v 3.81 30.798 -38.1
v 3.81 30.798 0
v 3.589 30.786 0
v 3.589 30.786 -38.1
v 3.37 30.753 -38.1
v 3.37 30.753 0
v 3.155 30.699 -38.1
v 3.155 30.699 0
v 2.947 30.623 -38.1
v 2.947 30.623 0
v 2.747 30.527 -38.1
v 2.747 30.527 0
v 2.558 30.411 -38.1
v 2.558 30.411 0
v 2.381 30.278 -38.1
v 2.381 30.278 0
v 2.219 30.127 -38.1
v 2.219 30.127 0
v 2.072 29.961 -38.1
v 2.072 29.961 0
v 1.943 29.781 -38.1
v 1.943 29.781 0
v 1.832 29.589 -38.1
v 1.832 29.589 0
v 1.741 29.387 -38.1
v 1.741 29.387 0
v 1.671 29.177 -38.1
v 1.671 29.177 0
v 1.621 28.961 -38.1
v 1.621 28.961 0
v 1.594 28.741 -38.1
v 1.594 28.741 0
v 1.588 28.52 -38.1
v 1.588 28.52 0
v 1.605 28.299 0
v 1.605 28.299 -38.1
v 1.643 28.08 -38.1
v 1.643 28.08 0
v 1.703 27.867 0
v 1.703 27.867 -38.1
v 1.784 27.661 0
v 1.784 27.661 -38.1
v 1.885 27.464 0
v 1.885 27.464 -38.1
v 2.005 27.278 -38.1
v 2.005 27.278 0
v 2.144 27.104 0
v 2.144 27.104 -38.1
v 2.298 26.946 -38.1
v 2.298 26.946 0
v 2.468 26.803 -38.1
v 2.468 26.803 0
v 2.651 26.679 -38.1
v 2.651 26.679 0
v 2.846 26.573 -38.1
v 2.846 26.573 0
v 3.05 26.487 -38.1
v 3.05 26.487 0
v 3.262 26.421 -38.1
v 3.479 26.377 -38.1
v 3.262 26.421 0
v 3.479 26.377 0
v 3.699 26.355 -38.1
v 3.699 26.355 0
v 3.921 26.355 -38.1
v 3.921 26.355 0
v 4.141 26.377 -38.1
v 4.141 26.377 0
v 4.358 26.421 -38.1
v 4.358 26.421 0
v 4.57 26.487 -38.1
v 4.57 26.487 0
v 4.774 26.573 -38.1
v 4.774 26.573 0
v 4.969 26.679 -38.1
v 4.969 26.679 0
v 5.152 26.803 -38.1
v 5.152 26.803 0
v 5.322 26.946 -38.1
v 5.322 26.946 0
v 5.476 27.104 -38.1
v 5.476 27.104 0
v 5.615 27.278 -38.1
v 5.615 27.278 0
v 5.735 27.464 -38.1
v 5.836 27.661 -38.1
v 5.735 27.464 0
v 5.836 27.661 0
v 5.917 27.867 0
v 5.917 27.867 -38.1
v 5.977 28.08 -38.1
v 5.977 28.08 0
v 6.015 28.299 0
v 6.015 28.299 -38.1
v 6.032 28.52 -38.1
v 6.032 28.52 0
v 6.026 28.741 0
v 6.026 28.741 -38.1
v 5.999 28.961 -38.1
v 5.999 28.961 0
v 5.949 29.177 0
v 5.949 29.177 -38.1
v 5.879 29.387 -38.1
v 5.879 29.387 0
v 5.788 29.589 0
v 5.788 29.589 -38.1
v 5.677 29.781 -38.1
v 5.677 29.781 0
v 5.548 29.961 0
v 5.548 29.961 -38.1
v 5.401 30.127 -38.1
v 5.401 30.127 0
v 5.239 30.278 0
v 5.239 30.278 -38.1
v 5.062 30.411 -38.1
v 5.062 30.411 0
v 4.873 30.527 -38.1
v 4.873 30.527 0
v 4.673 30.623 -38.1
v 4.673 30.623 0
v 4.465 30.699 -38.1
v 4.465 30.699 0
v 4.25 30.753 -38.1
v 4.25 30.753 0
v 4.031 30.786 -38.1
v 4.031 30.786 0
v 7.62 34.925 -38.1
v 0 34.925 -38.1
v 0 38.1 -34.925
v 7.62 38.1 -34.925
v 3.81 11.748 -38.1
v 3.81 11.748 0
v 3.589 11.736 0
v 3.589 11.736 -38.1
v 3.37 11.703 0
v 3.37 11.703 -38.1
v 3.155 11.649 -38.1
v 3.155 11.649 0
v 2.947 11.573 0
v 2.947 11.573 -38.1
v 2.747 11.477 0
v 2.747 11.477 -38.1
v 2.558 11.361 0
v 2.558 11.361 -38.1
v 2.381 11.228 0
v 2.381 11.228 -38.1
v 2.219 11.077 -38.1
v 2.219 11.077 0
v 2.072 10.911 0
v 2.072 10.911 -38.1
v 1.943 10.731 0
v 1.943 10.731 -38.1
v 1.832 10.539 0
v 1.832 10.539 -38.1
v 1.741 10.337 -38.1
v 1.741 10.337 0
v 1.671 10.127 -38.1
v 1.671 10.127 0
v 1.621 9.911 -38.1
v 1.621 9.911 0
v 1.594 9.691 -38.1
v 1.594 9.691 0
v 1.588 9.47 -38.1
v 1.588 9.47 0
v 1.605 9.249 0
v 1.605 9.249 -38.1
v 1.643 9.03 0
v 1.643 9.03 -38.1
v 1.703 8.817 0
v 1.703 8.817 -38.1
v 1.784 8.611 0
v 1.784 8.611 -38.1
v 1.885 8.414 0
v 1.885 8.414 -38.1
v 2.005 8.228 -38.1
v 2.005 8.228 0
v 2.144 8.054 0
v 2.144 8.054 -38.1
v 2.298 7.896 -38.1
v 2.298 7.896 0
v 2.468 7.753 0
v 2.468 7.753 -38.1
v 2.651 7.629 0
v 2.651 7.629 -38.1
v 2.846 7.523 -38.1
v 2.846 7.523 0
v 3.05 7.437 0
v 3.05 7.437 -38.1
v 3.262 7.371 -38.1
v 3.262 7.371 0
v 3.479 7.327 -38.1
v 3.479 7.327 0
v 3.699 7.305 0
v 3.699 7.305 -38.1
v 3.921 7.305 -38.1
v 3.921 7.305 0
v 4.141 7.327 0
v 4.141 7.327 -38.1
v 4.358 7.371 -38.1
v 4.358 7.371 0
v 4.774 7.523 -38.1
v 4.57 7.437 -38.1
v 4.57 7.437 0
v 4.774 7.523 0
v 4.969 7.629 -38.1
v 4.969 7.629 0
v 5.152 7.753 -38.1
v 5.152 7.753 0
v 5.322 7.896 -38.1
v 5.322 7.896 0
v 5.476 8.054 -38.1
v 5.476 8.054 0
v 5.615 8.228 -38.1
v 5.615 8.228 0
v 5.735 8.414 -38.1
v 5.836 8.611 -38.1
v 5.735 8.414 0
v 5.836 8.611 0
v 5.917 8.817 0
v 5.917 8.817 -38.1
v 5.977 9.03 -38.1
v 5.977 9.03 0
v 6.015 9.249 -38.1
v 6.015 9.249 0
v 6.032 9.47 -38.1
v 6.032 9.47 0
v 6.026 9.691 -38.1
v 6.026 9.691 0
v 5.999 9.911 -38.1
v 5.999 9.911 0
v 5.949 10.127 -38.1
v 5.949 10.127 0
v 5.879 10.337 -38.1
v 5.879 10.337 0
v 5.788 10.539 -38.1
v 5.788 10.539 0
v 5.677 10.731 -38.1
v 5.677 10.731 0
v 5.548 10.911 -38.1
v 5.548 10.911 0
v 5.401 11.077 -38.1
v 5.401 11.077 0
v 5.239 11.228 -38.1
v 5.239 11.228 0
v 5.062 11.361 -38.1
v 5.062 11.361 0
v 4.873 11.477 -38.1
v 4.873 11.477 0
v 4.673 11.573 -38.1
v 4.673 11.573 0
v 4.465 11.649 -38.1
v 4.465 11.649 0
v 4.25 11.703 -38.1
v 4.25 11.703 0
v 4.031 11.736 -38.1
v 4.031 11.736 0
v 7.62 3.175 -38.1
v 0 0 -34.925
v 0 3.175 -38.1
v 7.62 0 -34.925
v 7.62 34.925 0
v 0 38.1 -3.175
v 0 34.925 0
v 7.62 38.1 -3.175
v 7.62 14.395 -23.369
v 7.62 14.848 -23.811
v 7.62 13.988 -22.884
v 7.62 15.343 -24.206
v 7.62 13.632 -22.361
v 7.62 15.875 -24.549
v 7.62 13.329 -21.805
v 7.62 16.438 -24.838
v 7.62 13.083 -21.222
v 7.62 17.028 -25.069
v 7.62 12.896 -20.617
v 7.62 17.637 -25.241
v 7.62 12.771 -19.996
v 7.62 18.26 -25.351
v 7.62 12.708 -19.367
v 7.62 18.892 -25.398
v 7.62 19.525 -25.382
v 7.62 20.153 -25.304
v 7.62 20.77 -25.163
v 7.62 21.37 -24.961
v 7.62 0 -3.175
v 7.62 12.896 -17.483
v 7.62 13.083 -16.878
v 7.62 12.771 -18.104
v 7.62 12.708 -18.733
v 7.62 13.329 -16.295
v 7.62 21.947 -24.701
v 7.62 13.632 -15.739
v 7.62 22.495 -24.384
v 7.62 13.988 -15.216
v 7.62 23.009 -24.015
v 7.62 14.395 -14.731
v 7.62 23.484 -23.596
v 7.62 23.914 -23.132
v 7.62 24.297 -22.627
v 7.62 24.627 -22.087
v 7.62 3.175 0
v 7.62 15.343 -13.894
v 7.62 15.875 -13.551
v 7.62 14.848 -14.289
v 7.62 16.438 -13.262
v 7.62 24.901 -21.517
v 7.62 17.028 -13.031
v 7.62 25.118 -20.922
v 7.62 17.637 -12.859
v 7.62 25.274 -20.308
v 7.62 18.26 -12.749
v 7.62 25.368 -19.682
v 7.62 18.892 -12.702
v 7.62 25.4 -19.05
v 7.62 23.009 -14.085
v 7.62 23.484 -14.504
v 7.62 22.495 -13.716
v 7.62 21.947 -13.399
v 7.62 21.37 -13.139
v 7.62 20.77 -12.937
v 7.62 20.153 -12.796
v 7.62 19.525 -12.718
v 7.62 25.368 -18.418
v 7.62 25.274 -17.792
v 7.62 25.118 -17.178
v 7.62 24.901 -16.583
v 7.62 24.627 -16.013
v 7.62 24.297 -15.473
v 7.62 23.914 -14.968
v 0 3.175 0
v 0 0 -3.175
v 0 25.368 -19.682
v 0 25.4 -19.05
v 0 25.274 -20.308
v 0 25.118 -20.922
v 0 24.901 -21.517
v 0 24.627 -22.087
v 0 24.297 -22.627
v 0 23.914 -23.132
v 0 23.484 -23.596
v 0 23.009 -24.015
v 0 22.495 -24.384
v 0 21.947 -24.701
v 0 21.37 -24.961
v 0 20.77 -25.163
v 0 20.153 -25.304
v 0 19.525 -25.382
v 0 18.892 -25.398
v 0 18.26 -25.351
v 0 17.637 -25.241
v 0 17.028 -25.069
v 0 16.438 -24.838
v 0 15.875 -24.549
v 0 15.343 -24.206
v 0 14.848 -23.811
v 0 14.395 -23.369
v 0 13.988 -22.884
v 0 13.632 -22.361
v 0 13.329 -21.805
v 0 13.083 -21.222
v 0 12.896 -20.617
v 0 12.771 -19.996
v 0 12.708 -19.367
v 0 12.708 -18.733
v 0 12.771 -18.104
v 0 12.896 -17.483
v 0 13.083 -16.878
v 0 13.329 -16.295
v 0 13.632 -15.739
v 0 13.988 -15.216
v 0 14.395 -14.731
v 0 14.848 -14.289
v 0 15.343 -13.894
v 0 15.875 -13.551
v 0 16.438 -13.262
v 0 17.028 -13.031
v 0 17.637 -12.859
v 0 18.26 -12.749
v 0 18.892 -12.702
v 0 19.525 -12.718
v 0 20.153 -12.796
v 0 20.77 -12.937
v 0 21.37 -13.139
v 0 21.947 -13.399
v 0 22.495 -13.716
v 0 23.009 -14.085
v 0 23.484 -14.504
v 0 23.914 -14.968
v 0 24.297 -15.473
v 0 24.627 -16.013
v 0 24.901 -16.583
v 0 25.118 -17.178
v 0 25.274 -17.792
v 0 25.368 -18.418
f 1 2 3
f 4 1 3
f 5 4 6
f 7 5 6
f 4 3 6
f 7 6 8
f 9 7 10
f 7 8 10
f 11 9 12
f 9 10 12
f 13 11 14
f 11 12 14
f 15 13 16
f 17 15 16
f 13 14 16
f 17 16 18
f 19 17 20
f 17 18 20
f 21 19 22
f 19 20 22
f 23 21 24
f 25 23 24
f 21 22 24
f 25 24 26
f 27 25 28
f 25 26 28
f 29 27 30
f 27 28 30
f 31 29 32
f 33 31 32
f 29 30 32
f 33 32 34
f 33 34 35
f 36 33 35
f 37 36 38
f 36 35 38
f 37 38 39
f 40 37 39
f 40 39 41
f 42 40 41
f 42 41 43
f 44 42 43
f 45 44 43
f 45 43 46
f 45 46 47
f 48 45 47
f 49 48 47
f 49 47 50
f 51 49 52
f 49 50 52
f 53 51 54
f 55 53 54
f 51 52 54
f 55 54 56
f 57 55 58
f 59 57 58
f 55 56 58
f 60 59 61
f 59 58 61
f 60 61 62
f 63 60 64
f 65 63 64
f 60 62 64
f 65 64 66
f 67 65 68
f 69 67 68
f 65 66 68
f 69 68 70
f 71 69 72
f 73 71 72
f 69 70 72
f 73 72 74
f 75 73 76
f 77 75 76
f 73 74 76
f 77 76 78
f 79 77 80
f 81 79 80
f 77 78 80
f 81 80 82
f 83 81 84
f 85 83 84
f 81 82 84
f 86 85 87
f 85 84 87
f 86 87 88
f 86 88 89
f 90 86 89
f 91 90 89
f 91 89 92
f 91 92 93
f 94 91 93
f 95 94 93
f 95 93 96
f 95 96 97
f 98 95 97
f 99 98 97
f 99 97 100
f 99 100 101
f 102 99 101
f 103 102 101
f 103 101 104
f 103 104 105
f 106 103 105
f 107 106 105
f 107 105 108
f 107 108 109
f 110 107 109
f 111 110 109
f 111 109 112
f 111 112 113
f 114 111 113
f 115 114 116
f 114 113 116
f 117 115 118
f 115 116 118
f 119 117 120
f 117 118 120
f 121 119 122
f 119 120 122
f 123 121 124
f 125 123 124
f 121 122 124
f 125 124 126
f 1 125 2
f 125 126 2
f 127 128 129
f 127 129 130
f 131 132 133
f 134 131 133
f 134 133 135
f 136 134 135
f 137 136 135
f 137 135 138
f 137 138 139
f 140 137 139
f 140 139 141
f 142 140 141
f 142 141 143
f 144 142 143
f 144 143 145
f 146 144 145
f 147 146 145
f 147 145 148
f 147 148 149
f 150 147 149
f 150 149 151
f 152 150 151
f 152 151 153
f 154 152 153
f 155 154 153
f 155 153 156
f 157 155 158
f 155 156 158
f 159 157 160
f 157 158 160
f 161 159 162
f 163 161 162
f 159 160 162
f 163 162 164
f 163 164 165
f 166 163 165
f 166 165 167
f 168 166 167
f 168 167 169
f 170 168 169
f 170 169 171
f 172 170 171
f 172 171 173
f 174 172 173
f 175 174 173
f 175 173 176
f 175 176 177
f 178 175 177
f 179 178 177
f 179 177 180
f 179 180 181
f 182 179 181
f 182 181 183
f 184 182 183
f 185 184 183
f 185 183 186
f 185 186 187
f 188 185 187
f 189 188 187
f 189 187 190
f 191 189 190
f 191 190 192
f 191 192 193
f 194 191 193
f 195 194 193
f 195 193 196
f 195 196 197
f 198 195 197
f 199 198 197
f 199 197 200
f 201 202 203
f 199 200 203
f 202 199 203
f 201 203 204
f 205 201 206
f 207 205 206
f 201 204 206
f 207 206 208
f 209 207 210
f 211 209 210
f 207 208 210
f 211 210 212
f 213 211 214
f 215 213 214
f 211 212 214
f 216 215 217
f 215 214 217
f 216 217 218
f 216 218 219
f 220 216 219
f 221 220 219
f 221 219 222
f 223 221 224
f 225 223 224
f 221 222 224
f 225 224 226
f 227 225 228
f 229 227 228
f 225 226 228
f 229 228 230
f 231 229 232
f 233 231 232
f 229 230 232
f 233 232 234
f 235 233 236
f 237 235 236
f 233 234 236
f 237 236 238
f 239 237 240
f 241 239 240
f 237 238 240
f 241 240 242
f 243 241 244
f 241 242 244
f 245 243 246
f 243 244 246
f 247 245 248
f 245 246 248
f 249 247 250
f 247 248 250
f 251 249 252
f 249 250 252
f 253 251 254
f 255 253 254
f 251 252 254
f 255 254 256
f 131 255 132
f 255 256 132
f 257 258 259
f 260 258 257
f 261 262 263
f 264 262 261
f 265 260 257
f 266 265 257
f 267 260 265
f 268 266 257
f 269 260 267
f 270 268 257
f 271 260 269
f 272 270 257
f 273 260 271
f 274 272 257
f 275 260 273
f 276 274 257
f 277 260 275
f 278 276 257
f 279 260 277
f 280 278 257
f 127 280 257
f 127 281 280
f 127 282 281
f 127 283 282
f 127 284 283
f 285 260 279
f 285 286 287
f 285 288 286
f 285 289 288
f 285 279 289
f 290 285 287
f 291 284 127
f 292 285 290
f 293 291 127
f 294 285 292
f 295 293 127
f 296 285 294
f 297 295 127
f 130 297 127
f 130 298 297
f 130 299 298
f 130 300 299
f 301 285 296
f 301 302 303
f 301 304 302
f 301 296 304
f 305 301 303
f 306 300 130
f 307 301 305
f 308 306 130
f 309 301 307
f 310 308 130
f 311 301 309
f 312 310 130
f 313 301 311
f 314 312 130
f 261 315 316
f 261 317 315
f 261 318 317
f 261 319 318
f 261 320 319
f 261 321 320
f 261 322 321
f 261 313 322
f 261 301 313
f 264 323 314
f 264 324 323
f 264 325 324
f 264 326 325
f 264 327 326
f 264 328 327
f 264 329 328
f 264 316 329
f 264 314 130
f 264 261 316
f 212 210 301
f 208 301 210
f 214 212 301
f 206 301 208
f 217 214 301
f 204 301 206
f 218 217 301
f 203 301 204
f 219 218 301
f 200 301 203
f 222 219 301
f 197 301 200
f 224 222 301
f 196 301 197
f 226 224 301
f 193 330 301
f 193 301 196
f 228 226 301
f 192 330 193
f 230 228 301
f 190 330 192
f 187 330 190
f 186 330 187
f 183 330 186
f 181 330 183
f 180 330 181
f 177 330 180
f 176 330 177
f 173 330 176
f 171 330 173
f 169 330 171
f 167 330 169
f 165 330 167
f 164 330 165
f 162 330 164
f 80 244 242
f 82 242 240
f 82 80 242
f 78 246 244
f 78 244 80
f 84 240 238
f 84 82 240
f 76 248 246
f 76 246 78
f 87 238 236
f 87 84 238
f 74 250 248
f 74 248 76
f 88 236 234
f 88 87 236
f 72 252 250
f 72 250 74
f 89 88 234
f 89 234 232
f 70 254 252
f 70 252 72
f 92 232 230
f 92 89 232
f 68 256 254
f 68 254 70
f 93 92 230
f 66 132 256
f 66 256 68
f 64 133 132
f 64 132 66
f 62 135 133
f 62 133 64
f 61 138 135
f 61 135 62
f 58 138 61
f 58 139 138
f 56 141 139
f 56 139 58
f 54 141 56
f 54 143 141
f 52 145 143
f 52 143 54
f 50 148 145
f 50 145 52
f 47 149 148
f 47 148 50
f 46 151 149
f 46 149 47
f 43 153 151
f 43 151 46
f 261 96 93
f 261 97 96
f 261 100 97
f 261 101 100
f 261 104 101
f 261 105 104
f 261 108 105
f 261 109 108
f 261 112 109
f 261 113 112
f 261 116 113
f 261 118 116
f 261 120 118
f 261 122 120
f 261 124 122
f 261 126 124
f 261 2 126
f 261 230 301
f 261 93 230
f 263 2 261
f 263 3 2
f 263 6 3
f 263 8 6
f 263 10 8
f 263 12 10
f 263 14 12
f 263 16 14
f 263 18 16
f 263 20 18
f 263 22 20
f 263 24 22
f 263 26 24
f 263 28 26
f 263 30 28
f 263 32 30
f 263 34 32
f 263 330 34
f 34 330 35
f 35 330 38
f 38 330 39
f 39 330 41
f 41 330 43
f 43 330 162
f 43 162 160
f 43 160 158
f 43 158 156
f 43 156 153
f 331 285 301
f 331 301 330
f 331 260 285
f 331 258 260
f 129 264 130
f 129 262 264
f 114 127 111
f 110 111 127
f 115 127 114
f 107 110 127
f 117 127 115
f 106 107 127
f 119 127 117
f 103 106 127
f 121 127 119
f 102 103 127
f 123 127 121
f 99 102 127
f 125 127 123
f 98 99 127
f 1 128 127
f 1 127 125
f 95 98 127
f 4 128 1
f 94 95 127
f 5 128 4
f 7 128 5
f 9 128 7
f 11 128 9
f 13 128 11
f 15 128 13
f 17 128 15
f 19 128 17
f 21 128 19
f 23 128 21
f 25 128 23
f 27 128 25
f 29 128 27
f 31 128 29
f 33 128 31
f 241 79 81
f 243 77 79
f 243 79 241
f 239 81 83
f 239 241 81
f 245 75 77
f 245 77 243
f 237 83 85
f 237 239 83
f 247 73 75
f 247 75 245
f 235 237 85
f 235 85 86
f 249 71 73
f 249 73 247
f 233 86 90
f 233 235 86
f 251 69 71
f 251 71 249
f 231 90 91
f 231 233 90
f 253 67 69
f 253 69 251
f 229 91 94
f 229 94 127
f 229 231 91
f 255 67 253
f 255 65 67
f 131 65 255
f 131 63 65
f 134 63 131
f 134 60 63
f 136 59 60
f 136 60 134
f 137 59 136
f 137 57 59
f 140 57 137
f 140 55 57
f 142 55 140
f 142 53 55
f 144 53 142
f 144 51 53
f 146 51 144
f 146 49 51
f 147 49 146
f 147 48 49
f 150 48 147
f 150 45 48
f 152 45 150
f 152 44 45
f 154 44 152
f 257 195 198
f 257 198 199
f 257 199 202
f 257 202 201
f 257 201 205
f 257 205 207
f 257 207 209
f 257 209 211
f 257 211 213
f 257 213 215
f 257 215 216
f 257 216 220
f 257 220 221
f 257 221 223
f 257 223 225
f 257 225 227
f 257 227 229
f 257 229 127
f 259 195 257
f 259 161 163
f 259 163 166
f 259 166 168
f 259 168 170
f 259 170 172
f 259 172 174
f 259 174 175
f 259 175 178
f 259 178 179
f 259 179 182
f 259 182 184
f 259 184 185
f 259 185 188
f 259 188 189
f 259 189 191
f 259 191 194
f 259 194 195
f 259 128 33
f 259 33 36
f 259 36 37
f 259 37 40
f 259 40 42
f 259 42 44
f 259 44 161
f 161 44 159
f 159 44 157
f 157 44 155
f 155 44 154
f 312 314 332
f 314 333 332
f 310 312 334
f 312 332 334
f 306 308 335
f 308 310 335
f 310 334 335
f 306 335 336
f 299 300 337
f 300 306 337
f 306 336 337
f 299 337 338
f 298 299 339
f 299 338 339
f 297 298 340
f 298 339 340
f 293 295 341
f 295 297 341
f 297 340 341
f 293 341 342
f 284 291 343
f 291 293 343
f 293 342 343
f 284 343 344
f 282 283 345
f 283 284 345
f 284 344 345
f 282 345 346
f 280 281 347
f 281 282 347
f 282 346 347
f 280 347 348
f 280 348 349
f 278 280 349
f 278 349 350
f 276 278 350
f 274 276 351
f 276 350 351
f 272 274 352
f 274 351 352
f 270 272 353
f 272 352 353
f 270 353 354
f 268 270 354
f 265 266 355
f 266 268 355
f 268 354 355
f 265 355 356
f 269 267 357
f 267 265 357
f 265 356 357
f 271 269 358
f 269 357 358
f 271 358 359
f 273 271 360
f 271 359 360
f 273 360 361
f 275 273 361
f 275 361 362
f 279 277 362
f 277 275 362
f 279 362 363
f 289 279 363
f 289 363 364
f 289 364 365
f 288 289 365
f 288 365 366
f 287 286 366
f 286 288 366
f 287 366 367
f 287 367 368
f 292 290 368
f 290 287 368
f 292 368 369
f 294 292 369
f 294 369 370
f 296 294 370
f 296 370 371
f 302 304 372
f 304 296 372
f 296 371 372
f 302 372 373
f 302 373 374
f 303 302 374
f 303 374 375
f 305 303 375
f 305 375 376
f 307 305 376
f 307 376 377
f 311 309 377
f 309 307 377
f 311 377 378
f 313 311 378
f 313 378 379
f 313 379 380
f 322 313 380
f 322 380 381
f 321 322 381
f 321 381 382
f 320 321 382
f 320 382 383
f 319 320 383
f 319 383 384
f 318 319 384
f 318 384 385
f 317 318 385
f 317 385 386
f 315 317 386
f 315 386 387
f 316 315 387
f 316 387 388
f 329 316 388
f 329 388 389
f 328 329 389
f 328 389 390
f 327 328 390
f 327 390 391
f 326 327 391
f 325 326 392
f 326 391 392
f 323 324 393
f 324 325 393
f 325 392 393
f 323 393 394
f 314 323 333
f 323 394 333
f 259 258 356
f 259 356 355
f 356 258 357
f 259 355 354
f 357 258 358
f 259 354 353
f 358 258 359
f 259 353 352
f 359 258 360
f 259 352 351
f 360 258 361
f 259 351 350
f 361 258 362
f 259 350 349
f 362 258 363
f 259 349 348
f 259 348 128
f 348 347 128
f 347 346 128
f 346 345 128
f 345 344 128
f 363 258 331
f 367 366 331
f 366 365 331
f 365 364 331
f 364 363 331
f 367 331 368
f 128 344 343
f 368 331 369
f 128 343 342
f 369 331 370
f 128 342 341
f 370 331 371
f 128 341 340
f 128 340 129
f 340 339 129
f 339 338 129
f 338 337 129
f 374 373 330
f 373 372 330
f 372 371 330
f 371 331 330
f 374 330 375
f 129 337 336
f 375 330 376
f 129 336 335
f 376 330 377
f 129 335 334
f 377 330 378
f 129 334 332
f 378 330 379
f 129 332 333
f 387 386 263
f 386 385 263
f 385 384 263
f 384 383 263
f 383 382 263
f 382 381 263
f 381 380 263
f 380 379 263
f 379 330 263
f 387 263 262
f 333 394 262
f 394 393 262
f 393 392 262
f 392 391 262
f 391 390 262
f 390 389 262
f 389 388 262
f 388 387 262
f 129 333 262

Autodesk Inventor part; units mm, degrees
ref_plane "YZ Plane" through (0, 0, 0) normal (1, 0, 0) x (0, 1, 0)
ref_plane "XZ Plane" through (0, 0, 0) normal (0, 1, 0) x (-1, 0, 0)
ref_plane "XY Plane" through (0, 0, 0) normal (0, 0, 1) x (1, 0, 0)
sketch "Sketch1" plane through (0, 0, 0) normal (1, 0, 0) x (0, 1, 0)
  line L0 (0, 0) -> (38.1, 0)
  line L1 (38.1, 0) -> (38.1, -38.1)
  line L2 (38.1, -38.1) -> (0, -38.1)
  line L3 (0, -38.1) -> (0, 0)
  circle A0 centre (19.05, -19.05) radius 6.35
  dimension "d0" = 38.1
  dimension "d1" = 38.1
  dimension "d2" = 12.7
extrude "Extrusion1" add sketch "Sketch1" along normal blind 7.62
chamfer "Chamfer1" distance 3.175 angle 45 4 edges at (3.81, 38.1, 0) (3.81, 38.1, -38.1) (3.81, 0, 0) (3.81, 0, -38.1)
sketch "Sketch2" plane through (0, 3.175, -38.1) normal (0, 0, -1) x (-1, 0, 0)
  line L0 (0, 0) -> (-7.62, 0) projected
  line L1 (0, 31.75) -> (0, 0) projected
  line L2 (-7.62, 31.75) -> (0, 31.75) projected
  line L3 (-7.62, 0) -> (-7.62, 31.75) projected
  line L4 (-3.81, 15.875) -> (-3.81, 25.4)
  line L5 (-3.81, 25.4) -> (-3.81, 6.35)
  point P0 (0, -3.175)
  dimension "d10" = 9.525
  dimension "d11" = 19.05
hole "Hole1" at (3.81, 28.575, -38.1) at (3.81, 9.525, -38.1) direction (0, 0, 1) diameter 4.445 end through all
properties part number "1.5 in bearing block"
